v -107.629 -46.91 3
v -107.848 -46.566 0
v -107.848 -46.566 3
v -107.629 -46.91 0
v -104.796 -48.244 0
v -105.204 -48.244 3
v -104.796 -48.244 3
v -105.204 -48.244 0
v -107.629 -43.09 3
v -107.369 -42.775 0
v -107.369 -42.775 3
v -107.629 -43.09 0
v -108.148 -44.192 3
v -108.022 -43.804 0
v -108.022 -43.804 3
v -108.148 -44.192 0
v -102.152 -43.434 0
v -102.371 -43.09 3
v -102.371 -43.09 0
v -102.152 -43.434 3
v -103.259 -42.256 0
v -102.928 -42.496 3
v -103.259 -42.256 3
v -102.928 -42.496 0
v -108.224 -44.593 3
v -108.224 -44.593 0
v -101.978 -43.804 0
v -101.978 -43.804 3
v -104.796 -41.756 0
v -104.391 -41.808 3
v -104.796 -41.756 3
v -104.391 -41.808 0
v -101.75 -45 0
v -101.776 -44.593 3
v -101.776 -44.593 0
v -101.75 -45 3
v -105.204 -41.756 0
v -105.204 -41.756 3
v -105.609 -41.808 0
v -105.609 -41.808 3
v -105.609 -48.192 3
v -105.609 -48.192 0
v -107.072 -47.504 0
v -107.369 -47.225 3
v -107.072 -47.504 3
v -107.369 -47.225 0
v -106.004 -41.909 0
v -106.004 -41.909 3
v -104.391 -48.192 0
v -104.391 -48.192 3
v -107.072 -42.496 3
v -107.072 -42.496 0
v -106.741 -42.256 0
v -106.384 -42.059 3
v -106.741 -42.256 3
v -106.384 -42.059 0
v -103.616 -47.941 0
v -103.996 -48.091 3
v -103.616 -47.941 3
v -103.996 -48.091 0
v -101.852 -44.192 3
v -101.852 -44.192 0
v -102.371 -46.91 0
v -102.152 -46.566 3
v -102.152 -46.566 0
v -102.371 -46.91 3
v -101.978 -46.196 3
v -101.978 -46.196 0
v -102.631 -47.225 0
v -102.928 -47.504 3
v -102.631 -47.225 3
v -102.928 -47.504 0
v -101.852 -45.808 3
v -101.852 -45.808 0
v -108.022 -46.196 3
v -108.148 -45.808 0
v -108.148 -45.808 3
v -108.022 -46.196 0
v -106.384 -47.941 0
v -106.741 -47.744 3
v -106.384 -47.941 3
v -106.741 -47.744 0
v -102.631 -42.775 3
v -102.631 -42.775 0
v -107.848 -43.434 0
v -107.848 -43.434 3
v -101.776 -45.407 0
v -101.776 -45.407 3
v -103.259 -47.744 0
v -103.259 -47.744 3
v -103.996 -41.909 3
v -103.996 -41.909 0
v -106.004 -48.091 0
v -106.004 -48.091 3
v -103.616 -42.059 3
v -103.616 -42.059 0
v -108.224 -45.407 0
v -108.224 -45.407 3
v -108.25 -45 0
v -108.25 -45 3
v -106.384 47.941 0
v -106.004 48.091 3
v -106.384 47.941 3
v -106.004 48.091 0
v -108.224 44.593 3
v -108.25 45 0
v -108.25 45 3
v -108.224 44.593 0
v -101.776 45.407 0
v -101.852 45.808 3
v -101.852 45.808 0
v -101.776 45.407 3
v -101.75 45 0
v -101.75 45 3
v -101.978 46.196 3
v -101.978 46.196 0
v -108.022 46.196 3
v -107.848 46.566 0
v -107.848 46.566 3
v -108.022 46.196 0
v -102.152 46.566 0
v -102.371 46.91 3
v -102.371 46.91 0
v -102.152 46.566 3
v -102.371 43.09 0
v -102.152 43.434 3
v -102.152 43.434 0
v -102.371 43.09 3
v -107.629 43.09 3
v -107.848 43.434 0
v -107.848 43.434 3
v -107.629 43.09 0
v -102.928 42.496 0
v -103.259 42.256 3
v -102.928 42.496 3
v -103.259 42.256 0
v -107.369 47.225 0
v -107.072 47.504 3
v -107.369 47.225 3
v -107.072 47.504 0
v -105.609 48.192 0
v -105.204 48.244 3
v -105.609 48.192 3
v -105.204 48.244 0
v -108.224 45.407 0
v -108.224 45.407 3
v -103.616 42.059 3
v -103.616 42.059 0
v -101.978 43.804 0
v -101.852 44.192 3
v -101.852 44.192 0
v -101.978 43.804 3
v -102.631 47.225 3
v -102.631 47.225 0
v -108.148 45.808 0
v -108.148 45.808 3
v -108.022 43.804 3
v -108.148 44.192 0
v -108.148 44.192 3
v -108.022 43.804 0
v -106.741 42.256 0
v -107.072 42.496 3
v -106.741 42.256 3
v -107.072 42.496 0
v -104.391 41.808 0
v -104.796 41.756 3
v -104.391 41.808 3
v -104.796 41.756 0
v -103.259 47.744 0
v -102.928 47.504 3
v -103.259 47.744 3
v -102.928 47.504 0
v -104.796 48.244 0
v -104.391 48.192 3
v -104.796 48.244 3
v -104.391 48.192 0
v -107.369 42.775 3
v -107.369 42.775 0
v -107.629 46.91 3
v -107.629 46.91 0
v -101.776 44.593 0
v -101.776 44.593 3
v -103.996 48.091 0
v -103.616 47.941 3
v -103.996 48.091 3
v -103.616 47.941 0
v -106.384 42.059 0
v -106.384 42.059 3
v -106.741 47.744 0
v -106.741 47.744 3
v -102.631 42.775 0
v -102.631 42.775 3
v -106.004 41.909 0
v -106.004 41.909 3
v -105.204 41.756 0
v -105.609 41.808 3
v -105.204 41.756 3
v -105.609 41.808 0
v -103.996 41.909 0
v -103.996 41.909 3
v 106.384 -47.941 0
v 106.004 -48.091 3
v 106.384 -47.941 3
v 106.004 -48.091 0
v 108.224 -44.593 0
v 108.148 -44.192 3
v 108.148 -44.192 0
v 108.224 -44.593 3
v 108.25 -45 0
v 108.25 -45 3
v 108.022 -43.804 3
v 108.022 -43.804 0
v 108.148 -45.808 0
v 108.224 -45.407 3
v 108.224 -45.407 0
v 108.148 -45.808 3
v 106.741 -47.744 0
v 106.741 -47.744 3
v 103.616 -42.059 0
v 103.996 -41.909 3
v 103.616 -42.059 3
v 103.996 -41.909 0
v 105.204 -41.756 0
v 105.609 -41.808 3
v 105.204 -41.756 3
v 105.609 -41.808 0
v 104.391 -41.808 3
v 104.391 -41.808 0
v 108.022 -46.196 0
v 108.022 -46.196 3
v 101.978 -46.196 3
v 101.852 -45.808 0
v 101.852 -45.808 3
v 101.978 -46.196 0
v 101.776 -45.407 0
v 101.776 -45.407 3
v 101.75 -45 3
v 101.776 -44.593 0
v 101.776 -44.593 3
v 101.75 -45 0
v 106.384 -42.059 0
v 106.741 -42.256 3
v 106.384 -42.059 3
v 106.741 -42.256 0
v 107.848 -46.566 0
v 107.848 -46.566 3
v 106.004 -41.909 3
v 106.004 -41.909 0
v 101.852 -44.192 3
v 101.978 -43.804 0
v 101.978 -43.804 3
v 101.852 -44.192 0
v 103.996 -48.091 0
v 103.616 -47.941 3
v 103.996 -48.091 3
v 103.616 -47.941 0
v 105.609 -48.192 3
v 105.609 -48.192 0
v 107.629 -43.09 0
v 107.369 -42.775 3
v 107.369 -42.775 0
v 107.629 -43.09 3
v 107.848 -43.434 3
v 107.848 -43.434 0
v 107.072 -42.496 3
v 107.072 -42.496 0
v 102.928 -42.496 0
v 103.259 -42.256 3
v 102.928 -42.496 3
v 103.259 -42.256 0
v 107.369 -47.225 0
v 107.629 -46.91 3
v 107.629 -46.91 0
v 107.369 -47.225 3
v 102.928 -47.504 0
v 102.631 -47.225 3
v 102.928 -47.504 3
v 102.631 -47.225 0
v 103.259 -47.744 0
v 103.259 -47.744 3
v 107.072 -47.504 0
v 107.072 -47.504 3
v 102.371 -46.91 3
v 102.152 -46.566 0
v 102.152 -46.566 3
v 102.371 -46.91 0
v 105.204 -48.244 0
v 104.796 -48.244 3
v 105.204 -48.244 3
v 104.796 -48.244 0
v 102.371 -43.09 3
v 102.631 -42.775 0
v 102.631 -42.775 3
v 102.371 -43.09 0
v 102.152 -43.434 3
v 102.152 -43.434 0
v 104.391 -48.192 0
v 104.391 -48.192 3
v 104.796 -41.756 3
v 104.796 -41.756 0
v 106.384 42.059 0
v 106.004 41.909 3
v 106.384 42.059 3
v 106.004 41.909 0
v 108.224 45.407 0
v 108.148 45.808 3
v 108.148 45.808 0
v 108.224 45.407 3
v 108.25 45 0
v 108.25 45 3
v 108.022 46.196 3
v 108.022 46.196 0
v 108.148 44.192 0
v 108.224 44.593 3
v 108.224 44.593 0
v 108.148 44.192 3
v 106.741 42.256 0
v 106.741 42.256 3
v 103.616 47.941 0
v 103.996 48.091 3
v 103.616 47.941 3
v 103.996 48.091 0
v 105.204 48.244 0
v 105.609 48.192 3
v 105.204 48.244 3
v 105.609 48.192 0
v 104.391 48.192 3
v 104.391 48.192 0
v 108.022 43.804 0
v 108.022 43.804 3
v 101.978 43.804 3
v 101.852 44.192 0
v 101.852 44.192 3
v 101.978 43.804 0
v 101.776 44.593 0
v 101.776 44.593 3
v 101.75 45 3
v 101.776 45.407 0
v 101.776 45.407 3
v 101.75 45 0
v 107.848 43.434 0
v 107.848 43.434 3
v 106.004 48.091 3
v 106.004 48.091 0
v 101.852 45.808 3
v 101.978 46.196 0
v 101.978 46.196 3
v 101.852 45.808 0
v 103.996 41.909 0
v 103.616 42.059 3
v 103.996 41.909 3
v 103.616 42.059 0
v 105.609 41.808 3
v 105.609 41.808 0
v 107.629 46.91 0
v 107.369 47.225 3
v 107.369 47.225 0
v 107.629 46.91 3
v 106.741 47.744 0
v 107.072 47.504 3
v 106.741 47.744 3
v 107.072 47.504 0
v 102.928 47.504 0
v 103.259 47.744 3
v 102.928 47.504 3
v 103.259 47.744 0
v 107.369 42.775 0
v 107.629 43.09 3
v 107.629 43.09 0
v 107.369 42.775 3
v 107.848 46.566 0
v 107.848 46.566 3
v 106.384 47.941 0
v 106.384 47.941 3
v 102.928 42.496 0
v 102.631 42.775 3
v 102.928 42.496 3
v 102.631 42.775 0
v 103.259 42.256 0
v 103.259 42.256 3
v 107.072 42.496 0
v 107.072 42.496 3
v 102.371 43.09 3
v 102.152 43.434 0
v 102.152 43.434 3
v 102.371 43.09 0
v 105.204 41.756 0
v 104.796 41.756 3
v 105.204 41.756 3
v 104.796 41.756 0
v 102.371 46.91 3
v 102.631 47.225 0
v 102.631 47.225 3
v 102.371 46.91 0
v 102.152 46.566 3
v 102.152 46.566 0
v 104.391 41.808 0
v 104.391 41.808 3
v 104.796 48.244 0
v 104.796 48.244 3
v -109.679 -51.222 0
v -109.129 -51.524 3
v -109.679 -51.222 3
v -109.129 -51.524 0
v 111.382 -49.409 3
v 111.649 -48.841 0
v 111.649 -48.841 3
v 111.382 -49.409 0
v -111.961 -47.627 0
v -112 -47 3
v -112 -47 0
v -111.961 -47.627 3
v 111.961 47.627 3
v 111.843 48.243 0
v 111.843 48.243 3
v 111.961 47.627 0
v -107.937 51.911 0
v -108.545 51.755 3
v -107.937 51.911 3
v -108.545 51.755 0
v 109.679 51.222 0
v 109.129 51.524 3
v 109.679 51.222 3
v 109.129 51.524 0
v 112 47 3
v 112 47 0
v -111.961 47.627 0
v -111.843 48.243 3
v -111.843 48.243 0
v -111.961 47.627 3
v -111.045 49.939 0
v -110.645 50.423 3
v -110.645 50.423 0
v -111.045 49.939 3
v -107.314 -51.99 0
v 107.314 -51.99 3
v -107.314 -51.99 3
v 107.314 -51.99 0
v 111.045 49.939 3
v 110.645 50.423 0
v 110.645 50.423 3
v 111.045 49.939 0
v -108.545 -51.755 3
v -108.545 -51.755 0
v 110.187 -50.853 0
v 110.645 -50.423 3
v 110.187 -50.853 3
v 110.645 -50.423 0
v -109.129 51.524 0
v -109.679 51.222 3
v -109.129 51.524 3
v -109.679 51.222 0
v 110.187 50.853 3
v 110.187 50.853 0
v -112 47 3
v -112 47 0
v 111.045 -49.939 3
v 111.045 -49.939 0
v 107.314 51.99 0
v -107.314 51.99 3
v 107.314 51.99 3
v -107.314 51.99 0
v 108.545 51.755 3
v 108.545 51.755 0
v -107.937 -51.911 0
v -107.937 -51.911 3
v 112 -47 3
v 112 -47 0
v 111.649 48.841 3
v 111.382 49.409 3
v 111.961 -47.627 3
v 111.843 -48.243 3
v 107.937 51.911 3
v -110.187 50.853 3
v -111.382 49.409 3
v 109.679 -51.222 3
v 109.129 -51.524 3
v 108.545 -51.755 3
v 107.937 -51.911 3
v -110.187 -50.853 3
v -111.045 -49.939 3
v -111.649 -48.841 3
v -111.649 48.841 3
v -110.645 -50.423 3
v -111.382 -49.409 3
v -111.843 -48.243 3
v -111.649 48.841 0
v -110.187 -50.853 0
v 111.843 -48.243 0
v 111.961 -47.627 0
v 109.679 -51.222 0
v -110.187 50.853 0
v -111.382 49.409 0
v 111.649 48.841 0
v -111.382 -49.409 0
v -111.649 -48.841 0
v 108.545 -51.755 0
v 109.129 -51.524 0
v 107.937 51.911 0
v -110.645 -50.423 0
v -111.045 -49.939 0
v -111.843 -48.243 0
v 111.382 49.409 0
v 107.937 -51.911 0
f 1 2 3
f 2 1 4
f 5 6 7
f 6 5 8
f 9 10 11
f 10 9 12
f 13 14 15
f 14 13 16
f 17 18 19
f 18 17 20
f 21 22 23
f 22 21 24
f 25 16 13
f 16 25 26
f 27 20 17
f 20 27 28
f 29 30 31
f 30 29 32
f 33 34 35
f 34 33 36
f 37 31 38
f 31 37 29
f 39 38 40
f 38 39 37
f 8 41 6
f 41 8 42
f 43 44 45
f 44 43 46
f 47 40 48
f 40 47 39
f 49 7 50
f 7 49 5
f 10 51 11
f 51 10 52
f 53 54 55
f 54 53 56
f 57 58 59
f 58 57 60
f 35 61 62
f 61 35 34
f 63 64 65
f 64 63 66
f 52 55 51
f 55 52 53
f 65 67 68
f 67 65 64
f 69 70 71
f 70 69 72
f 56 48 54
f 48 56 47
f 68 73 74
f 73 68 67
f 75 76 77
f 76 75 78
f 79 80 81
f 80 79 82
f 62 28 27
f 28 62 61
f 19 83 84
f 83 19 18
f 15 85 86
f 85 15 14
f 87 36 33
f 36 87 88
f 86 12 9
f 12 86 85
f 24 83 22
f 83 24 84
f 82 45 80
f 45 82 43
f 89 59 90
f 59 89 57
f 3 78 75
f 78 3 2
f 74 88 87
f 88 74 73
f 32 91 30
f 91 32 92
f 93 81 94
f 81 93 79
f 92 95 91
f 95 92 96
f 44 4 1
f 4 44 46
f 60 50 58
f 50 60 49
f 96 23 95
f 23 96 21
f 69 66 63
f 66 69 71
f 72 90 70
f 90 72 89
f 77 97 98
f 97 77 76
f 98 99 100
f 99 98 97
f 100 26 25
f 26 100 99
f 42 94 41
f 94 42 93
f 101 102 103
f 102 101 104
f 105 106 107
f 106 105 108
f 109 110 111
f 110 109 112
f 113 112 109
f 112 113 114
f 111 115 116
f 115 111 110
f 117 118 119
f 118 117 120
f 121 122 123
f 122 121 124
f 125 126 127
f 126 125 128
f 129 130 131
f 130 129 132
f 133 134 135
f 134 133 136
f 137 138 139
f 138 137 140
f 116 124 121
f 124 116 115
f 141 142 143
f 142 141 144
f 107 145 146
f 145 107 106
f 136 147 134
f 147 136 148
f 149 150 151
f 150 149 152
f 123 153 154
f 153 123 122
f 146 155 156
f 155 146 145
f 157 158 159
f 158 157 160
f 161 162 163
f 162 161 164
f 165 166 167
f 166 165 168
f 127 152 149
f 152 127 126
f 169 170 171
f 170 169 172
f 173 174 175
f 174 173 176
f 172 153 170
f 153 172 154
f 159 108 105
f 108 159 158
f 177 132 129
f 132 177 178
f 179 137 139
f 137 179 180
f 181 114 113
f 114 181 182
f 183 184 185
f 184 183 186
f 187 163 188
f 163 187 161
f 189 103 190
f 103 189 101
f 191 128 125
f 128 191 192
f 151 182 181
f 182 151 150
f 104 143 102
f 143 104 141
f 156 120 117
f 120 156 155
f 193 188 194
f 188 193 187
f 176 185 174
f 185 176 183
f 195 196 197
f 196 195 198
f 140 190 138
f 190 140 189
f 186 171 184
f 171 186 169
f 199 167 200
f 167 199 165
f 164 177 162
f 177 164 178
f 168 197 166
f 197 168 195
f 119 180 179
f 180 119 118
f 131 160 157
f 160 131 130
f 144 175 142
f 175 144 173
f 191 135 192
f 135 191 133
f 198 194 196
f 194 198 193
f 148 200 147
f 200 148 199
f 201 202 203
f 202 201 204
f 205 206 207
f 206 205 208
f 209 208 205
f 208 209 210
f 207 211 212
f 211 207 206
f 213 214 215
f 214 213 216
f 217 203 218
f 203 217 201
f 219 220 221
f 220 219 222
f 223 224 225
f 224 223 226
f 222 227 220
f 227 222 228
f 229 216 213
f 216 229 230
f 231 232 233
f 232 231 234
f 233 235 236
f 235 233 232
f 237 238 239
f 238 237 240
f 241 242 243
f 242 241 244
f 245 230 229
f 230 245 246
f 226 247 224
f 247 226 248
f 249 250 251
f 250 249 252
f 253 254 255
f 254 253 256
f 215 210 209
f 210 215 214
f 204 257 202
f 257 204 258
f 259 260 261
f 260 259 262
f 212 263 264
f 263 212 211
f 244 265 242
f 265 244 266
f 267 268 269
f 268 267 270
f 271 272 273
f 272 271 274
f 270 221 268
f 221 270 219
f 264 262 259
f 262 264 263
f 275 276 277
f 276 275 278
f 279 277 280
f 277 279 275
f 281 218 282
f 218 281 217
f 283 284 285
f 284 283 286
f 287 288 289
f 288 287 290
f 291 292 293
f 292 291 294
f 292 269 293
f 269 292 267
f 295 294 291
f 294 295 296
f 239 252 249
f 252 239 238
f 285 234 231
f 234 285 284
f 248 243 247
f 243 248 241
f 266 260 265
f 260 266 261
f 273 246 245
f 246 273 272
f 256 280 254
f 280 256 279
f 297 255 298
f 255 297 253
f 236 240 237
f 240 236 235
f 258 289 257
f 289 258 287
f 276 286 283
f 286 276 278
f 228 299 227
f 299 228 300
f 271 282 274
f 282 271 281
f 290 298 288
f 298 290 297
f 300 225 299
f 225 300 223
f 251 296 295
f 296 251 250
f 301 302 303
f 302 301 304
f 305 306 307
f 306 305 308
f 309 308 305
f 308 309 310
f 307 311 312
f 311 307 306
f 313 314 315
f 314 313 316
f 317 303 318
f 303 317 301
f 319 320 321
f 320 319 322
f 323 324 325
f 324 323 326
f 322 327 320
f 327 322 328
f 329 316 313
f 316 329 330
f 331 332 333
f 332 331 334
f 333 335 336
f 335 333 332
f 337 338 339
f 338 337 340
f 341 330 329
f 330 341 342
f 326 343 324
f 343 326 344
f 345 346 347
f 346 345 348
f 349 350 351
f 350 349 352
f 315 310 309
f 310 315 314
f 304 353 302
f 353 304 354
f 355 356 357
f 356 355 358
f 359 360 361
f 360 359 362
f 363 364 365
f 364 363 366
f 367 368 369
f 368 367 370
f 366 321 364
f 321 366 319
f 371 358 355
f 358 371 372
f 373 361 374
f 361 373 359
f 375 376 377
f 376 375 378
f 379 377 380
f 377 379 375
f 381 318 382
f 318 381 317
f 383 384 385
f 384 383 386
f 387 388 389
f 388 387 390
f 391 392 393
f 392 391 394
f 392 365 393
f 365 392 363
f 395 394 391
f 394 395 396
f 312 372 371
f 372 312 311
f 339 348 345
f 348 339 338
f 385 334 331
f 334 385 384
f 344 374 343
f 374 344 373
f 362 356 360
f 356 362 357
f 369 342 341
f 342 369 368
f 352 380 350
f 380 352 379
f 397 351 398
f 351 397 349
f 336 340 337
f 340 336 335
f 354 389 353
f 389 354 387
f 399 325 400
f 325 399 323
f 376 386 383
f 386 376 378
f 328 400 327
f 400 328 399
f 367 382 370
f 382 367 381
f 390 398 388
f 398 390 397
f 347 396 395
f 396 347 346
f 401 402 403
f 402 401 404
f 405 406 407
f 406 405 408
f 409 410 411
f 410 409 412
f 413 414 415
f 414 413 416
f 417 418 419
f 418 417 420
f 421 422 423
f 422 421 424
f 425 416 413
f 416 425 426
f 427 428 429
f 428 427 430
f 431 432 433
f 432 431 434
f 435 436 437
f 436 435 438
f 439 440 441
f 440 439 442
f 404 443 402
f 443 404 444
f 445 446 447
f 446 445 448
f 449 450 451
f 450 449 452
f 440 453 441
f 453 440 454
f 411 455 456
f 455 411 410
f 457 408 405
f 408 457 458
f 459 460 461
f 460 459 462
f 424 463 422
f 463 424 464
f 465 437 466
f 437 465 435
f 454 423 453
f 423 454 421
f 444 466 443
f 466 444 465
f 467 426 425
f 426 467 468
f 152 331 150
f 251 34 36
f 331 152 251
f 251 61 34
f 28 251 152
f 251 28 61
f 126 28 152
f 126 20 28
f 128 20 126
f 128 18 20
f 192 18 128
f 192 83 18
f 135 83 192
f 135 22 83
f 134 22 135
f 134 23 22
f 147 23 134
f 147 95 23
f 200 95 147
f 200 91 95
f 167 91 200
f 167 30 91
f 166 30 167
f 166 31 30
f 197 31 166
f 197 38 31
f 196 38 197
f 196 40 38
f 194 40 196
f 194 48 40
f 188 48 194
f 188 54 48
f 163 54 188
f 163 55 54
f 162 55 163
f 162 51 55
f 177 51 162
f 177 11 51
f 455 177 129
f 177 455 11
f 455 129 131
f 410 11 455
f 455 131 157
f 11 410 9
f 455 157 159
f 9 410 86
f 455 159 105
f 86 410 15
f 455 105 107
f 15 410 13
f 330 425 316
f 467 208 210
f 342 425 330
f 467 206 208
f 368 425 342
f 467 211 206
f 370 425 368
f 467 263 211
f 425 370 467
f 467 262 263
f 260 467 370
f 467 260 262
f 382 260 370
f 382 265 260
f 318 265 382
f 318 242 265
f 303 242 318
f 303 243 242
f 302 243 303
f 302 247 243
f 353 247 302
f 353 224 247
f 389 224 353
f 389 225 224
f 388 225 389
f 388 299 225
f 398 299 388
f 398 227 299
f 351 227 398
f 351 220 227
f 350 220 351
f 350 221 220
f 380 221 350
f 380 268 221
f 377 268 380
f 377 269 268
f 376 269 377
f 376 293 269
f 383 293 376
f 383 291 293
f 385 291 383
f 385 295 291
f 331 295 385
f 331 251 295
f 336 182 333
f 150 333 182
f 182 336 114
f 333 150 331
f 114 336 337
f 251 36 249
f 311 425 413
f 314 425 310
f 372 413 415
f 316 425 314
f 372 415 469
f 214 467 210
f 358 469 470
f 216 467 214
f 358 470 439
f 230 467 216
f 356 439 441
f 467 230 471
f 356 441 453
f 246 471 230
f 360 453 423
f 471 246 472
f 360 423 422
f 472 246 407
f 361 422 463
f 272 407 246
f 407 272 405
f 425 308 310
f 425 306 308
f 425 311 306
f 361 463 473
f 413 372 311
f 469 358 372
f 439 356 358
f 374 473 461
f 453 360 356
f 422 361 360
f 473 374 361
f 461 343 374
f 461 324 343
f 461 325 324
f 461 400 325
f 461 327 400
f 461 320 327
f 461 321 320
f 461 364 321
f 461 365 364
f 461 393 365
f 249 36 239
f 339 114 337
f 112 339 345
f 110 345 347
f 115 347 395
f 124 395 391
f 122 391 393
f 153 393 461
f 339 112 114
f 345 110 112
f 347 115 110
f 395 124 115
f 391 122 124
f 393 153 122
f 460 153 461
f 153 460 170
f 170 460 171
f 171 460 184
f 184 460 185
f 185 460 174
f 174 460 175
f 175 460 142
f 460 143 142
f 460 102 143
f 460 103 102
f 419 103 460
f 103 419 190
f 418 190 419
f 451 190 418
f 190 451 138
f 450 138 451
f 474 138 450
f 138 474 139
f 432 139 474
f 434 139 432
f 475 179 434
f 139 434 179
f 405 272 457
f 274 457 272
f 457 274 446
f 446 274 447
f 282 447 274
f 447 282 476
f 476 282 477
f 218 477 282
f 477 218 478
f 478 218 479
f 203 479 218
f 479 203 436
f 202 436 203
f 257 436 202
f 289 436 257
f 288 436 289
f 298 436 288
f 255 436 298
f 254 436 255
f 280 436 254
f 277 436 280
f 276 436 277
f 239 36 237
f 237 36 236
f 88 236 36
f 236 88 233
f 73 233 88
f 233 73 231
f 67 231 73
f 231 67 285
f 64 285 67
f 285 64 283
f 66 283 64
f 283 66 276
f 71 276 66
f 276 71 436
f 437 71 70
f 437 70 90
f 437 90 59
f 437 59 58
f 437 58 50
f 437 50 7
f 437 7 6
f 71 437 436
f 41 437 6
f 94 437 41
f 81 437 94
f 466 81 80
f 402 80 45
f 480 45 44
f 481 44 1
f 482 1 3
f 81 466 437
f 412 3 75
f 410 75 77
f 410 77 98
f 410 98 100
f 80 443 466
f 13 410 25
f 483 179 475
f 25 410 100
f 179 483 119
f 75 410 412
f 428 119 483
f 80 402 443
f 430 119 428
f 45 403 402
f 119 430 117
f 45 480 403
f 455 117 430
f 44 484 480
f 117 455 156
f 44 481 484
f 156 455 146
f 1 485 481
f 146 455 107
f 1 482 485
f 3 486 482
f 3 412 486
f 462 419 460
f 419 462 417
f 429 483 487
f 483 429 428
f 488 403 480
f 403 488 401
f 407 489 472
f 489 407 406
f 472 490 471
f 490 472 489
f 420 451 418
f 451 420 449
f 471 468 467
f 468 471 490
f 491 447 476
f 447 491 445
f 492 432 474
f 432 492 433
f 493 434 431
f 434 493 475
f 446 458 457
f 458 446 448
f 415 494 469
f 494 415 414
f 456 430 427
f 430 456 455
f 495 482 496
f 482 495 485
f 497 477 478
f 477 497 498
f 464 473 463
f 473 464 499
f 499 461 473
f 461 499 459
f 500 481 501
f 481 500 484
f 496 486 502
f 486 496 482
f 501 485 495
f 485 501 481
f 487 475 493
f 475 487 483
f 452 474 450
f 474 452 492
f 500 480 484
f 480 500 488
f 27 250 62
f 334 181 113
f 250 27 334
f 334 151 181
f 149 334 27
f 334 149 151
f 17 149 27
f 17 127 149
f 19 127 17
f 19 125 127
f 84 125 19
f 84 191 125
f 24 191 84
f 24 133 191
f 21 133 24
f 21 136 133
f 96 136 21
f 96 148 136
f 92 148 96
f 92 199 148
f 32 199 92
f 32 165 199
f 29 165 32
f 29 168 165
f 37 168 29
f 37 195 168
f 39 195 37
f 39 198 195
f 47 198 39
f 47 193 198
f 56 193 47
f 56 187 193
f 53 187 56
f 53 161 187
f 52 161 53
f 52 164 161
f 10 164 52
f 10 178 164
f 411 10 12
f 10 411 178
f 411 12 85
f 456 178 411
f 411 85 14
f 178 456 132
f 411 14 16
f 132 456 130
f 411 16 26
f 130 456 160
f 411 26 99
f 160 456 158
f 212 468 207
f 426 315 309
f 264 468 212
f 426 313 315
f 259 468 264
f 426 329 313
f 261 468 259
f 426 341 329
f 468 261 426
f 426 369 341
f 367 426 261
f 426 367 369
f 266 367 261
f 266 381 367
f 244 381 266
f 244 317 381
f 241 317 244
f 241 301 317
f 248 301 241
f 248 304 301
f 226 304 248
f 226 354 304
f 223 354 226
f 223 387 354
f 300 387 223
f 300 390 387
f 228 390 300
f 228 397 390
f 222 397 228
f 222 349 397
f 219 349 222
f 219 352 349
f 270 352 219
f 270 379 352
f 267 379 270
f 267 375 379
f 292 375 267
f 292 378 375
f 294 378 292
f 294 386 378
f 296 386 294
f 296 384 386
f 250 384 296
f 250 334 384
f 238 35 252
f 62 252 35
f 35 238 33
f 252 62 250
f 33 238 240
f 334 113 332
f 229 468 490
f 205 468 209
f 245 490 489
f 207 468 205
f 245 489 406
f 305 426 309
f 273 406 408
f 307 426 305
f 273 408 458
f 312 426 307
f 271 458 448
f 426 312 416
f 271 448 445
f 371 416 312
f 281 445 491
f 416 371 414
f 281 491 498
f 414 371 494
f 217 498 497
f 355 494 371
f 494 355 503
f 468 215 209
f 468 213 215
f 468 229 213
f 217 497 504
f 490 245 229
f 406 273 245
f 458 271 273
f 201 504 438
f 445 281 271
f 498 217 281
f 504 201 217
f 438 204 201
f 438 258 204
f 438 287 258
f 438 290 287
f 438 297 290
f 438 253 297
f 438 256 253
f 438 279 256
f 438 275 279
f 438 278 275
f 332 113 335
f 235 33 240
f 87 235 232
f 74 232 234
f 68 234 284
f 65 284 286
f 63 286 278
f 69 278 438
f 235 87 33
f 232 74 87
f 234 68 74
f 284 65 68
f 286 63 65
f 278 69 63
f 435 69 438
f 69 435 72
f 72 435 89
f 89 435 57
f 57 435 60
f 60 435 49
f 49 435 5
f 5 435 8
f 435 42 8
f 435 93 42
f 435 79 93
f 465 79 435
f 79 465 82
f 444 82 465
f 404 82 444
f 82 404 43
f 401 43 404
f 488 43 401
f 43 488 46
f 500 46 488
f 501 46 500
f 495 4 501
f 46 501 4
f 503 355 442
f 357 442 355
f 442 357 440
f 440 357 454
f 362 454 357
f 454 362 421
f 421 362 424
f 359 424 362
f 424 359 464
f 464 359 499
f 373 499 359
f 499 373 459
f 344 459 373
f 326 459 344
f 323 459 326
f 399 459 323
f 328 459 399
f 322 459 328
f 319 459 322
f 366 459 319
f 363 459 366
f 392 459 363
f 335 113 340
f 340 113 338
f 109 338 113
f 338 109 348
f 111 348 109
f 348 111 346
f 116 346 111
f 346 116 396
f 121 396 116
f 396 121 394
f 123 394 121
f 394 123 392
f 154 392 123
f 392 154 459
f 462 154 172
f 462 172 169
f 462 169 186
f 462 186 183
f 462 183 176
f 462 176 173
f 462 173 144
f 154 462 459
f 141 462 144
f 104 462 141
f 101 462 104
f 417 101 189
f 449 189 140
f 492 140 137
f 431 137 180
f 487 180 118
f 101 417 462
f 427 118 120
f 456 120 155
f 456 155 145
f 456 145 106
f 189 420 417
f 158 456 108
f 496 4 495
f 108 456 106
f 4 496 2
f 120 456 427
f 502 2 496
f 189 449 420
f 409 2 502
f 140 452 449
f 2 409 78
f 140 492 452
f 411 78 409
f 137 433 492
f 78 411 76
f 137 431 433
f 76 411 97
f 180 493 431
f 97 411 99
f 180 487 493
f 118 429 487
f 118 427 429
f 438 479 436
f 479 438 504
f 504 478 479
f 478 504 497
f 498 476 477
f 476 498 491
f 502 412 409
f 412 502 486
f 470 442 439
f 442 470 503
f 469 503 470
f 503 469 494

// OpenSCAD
$fn = 50;


difference() {
	union() {
		hull() {
			translate(v = [-107.0000000000, 47.0000000000, 0]) {
				cylinder(h = 3, r = 5);
			}
			translate(v = [107.0000000000, 47.0000000000, 0]) {
				cylinder(h = 3, r = 5);
			}
			translate(v = [-107.0000000000, -47.0000000000, 0]) {
				cylinder(h = 3, r = 5);
			}
			translate(v = [107.0000000000, -47.0000000000, 0]) {
				cylinder(h = 3, r = 5);
			}
		}
	}
	union() {
		translate(v = [-105.0000000000, -45.0000000000, -100.0000000000]) {
			cylinder(h = 200, r = 3.2500000000);
		}
		translate(v = [-105.0000000000, 45.0000000000, -100.0000000000]) {
			cylinder(h = 200, r = 3.2500000000);
		}
		translate(v = [105.0000000000, -45.0000000000, -100.0000000000]) {
			cylinder(h = 200, r = 3.2500000000);
		}
		translate(v = [105.0000000000, 45.0000000000, -100.0000000000]) {
			cylinder(h = 200, r = 3.2500000000);
		}
	}
}
